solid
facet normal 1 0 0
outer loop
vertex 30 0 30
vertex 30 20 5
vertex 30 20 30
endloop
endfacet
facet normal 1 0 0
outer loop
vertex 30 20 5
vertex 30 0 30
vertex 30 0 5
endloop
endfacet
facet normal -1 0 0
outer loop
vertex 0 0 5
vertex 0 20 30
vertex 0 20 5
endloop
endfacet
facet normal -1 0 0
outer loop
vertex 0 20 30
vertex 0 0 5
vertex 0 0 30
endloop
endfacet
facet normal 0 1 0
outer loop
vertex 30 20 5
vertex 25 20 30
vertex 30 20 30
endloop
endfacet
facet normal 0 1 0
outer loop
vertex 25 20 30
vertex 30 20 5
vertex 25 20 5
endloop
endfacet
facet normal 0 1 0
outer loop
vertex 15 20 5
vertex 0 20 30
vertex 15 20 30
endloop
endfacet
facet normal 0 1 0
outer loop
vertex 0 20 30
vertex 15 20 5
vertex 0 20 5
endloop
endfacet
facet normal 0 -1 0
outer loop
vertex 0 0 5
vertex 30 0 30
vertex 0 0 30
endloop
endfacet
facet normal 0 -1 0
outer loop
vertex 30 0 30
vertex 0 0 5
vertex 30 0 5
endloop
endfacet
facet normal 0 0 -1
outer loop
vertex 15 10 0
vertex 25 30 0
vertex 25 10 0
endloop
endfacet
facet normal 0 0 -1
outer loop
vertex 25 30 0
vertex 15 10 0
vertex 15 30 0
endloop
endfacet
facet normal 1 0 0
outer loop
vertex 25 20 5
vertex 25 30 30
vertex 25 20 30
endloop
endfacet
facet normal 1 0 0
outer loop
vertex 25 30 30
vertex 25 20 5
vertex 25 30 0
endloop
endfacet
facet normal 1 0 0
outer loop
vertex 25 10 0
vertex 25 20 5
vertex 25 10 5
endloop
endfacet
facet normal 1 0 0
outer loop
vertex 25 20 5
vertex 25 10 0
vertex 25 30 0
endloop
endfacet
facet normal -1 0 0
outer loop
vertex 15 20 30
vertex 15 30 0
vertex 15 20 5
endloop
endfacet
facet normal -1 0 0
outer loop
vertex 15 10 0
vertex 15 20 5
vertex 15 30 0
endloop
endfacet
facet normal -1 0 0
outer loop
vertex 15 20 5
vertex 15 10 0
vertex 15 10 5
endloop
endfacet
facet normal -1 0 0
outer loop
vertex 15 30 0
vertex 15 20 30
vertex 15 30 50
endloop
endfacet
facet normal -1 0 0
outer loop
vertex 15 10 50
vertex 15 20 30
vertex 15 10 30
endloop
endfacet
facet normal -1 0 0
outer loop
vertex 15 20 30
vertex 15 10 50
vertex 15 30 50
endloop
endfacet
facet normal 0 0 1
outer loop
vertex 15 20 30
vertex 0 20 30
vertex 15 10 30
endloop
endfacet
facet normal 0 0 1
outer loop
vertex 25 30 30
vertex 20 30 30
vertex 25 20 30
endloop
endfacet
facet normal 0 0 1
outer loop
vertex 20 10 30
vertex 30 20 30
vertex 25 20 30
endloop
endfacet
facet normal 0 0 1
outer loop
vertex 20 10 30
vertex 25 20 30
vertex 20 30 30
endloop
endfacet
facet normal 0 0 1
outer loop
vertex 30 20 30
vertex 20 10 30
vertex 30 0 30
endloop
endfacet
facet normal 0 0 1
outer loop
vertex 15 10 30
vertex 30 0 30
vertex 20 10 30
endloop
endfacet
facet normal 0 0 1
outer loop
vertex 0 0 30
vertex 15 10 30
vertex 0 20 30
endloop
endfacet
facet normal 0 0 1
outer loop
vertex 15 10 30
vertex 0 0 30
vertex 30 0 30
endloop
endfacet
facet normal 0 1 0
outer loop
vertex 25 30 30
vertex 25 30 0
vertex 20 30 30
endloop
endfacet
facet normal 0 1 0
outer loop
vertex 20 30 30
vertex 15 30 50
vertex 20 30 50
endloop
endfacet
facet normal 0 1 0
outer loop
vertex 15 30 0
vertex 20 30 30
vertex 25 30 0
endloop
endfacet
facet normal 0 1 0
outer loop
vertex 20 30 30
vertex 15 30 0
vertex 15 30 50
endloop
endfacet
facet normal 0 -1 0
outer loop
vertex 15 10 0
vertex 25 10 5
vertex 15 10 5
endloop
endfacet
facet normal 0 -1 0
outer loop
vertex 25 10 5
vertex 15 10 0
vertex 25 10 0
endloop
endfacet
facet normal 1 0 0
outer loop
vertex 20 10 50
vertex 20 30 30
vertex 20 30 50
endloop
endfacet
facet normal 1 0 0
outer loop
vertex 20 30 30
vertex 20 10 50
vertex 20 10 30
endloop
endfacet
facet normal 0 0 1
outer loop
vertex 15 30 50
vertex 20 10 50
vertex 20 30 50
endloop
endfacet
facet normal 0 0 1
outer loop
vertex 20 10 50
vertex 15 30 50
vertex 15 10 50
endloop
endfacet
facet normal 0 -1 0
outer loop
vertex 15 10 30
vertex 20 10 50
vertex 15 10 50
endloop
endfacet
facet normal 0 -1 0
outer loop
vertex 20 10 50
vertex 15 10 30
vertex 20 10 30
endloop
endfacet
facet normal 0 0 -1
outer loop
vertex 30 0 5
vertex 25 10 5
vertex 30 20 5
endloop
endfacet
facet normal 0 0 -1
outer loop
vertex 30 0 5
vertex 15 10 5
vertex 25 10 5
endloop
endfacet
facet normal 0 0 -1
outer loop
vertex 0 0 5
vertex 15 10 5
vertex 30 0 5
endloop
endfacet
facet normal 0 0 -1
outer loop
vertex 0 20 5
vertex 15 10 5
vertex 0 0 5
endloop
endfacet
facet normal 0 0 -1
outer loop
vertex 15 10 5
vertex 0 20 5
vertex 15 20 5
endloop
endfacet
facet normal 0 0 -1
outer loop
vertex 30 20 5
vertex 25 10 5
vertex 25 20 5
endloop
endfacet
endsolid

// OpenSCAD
// Create the base of the case
translate([0, 0, 5]) {
  cube([30, 20, 10]);
}

// Create the sides of the case
translate([0, 0, 15]) {
  cube([30, 20, 10]);
  translate([15, 10, 15]) {
    rotate([0, 90, 0]) {
      cube([30, 20, 10]);
    }
  }
}

// Create the lid of the case
translate([0, 0, 25]) {
  cube([30, 20, 5]);
  translate([15, 10, 25]) {
    rotate([0, 90, 0]) {
      cube([30, 20, 5]);
    }
  }
}

// Create the opening for the ESP8266
translate([15, 10, 30]) {
  rotate([0, 90, 0]) {
    cube([20, 15, 5]);
  }
}
